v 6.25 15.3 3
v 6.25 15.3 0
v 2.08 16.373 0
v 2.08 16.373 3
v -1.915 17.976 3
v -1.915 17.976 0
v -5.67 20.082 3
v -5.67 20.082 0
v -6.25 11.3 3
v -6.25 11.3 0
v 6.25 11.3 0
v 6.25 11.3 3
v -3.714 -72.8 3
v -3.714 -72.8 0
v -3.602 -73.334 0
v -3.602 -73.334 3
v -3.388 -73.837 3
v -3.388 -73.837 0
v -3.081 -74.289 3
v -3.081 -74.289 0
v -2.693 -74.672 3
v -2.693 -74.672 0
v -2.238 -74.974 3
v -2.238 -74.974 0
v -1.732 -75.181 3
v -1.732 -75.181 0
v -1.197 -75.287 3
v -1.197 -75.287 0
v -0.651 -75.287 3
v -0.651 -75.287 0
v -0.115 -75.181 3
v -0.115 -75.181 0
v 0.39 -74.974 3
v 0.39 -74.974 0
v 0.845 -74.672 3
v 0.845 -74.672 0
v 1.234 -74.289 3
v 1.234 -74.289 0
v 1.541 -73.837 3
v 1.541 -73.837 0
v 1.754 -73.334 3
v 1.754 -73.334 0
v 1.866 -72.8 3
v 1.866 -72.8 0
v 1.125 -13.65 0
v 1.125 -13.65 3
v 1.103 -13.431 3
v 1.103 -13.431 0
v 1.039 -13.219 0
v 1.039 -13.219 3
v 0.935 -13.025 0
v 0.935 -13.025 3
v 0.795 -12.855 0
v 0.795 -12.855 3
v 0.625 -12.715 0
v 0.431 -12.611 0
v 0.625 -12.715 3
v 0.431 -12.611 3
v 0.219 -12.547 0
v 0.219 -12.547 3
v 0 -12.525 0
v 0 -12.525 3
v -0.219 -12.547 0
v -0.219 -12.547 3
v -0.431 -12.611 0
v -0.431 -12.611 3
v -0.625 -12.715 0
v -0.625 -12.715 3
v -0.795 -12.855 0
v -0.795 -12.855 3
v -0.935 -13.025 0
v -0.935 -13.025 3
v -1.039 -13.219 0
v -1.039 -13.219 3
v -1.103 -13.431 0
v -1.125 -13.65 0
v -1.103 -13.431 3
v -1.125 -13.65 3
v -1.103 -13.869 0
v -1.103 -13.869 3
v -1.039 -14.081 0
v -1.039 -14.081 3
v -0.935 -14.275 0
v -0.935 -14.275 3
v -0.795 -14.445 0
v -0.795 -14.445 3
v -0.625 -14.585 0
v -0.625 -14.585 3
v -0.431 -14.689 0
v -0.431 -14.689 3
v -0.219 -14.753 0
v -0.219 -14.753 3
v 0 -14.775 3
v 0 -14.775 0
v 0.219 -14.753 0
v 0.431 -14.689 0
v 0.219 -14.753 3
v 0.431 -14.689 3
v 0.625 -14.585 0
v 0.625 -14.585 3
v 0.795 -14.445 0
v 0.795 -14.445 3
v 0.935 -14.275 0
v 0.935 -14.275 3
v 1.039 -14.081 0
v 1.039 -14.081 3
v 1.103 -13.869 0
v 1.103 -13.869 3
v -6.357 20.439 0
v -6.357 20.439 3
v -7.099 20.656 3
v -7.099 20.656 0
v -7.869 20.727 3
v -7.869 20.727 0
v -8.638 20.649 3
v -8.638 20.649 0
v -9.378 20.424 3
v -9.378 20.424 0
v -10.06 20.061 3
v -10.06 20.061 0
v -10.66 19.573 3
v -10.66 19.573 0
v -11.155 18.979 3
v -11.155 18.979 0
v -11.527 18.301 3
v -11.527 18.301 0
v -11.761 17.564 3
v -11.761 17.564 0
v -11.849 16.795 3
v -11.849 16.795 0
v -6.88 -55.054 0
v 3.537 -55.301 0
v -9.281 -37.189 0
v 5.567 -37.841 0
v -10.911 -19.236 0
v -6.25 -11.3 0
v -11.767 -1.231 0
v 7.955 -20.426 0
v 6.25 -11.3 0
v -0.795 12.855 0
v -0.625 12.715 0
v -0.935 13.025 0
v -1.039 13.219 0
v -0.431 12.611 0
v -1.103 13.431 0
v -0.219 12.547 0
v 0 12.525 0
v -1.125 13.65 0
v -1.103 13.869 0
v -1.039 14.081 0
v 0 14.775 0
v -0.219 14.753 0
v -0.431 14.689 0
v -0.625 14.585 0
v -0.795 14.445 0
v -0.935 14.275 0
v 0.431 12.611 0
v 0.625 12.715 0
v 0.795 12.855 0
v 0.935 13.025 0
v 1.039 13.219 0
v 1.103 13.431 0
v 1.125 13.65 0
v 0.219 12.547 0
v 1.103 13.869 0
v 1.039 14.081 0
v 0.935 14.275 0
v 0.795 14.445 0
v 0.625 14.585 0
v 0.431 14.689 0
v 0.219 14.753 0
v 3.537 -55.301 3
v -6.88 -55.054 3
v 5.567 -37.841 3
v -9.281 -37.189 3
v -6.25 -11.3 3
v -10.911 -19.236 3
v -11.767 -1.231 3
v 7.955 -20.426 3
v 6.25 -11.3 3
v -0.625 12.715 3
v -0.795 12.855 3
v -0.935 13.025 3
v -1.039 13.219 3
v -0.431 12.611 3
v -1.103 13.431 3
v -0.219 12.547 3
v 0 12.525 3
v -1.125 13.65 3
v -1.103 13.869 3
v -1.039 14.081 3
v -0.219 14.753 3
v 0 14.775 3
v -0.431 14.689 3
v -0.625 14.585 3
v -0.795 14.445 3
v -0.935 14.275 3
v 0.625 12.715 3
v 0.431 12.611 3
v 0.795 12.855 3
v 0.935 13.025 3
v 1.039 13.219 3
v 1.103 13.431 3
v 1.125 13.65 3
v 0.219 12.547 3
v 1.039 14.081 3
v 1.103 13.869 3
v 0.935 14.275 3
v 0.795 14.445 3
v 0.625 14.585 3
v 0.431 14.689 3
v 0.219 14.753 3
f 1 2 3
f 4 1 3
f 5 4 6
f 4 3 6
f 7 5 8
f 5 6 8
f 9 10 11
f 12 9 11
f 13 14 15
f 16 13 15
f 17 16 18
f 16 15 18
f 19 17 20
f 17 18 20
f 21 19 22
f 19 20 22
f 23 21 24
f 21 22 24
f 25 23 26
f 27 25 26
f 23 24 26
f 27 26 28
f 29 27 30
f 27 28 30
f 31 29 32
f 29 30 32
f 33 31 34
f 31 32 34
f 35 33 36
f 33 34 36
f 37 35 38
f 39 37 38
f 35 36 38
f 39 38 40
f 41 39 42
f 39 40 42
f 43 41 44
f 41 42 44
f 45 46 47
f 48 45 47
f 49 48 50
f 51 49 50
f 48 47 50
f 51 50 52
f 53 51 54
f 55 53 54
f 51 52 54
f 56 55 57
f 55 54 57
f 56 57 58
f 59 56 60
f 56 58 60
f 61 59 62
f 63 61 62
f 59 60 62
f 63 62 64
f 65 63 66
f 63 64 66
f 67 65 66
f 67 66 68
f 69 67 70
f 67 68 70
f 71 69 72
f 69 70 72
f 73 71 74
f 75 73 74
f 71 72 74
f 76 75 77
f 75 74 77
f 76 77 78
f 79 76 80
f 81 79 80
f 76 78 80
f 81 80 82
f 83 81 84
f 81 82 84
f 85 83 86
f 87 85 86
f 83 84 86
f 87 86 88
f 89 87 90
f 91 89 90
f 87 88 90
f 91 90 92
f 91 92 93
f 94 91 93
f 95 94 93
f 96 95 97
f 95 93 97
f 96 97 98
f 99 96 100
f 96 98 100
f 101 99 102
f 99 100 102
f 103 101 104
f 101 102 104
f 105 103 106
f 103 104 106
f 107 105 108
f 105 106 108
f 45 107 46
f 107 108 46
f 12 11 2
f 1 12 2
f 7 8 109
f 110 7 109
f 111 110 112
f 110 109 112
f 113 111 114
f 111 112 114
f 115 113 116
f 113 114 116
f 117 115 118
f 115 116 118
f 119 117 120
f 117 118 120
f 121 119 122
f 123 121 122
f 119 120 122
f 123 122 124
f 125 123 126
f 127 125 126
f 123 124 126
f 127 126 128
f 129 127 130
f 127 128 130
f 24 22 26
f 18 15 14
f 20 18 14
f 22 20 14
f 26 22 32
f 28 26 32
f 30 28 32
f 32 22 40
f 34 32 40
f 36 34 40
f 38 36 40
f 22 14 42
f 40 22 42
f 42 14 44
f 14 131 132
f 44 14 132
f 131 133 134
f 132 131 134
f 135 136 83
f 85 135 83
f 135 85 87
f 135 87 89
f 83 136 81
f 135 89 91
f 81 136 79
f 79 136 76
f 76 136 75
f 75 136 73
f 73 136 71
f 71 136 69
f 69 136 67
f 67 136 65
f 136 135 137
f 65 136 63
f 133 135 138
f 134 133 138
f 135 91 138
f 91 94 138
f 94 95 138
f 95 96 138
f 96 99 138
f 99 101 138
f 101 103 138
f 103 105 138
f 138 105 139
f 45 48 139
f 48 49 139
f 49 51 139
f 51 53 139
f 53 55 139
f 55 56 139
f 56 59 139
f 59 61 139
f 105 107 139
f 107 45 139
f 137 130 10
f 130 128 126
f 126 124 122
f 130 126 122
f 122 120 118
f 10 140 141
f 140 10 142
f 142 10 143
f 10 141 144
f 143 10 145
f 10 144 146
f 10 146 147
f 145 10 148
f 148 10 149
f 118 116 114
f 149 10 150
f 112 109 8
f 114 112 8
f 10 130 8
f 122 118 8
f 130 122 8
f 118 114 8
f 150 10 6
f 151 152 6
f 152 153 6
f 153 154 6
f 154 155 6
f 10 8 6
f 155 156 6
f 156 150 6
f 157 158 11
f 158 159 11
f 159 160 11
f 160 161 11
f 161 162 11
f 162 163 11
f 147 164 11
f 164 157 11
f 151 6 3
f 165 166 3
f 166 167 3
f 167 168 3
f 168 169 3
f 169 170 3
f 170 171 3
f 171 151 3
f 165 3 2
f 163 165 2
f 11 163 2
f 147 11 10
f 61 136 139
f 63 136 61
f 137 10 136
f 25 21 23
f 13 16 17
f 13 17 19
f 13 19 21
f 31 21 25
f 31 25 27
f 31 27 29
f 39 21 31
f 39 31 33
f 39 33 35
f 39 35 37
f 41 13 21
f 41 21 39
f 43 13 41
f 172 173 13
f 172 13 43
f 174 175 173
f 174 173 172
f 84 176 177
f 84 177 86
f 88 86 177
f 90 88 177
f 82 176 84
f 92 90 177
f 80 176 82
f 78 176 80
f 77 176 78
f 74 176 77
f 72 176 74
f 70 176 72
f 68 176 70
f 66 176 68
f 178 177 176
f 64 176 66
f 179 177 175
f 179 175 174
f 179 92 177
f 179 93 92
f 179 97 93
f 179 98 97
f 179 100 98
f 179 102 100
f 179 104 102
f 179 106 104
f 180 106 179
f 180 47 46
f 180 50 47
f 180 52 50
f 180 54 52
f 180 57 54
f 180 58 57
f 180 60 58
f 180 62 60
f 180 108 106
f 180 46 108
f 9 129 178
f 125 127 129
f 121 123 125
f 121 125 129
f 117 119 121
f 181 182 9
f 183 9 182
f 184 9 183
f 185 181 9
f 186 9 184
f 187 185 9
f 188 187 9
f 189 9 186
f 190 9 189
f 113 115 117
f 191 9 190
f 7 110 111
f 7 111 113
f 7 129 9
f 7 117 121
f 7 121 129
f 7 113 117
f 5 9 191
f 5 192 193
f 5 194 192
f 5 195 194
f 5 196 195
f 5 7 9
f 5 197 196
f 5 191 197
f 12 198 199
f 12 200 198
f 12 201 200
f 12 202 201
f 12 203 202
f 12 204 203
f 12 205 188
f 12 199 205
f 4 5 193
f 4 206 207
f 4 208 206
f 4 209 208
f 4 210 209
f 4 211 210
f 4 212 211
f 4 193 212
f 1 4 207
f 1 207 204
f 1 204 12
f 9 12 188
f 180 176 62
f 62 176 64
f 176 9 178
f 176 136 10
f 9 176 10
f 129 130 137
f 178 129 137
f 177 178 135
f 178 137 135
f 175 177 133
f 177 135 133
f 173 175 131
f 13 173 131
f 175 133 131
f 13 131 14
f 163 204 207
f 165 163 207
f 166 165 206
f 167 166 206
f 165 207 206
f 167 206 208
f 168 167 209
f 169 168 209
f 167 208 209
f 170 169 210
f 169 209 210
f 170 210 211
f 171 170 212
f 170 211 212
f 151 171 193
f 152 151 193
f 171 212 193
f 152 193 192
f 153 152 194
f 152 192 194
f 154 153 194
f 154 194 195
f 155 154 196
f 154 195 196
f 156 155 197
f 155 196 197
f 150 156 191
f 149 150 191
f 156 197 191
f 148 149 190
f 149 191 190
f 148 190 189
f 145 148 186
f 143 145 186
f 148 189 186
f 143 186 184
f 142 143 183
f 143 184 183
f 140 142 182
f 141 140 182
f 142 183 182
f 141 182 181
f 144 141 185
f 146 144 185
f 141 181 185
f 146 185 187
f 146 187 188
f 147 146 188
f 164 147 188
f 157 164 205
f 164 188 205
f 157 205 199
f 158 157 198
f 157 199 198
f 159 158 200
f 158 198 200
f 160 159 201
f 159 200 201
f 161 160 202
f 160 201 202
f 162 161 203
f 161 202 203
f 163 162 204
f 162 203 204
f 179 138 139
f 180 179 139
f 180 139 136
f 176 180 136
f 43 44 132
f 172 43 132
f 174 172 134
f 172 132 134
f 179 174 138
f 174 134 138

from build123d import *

# Parameters (mm, degrees)
SALIENTE_EXTRUIR1_DEPTH = 3
CROQUIS2_R              = 1.125
CORTAR_EXTRUIR1_DEPTH   = 3


with BuildPart() as part:
    # Croquis1 → Saliente-Extruir1 (new body)
    with BuildSketch(Plane.XY):
        with BuildLine():
            Line((-6.25, 11.3), (6.25, 11.3))
            Line((6.25, 11.3), (6.25, 15.3))
            ThreePointArc((6.25, 15.3), (0.056504012, 17.109442987), (-5.670411261, 20.081970181))
            ThreePointArc((-5.670411261, 20.081970181), (-9.727780496, 20.258869159), (-11.848630151, 16.795412057))
            ThreePointArc((-11.848630151, 16.795412057), (-10.192303885, -28.221209783), (-3.713791608, -72.8))
            ThreePointArc((-3.713791608, -72.8), (-0.923786204, -75.3), (1.8662192, -72.8))
            ThreePointArc((1.8662192, -72.8), (4.506721754, -46.566008889), (7.954822861, -20.425902882))
            Line((7.954822861, -20.425902882), (6.25, -11.3))
            Line((6.25, -11.3), (-6.25, -11.3))
            Line((-6.25, -11.3), (-6.25, 11.3))
        make_face()
    extrude(amount=SALIENTE_EXTRUIR1_DEPTH)

    # Croquis2 → Cortar-Extruir1 (cut)
    with BuildSketch(Plane.XY.offset(3)):
        with Locations((0, 13.65)):
            Circle(CROQUIS2_R)
        with Locations((0, -13.65)):
            Circle(CROQUIS2_R)
    extrude(amount=-CORTAR_EXTRUIR1_DEPTH, mode=Mode.SUBTRACT)


solid = part.part
